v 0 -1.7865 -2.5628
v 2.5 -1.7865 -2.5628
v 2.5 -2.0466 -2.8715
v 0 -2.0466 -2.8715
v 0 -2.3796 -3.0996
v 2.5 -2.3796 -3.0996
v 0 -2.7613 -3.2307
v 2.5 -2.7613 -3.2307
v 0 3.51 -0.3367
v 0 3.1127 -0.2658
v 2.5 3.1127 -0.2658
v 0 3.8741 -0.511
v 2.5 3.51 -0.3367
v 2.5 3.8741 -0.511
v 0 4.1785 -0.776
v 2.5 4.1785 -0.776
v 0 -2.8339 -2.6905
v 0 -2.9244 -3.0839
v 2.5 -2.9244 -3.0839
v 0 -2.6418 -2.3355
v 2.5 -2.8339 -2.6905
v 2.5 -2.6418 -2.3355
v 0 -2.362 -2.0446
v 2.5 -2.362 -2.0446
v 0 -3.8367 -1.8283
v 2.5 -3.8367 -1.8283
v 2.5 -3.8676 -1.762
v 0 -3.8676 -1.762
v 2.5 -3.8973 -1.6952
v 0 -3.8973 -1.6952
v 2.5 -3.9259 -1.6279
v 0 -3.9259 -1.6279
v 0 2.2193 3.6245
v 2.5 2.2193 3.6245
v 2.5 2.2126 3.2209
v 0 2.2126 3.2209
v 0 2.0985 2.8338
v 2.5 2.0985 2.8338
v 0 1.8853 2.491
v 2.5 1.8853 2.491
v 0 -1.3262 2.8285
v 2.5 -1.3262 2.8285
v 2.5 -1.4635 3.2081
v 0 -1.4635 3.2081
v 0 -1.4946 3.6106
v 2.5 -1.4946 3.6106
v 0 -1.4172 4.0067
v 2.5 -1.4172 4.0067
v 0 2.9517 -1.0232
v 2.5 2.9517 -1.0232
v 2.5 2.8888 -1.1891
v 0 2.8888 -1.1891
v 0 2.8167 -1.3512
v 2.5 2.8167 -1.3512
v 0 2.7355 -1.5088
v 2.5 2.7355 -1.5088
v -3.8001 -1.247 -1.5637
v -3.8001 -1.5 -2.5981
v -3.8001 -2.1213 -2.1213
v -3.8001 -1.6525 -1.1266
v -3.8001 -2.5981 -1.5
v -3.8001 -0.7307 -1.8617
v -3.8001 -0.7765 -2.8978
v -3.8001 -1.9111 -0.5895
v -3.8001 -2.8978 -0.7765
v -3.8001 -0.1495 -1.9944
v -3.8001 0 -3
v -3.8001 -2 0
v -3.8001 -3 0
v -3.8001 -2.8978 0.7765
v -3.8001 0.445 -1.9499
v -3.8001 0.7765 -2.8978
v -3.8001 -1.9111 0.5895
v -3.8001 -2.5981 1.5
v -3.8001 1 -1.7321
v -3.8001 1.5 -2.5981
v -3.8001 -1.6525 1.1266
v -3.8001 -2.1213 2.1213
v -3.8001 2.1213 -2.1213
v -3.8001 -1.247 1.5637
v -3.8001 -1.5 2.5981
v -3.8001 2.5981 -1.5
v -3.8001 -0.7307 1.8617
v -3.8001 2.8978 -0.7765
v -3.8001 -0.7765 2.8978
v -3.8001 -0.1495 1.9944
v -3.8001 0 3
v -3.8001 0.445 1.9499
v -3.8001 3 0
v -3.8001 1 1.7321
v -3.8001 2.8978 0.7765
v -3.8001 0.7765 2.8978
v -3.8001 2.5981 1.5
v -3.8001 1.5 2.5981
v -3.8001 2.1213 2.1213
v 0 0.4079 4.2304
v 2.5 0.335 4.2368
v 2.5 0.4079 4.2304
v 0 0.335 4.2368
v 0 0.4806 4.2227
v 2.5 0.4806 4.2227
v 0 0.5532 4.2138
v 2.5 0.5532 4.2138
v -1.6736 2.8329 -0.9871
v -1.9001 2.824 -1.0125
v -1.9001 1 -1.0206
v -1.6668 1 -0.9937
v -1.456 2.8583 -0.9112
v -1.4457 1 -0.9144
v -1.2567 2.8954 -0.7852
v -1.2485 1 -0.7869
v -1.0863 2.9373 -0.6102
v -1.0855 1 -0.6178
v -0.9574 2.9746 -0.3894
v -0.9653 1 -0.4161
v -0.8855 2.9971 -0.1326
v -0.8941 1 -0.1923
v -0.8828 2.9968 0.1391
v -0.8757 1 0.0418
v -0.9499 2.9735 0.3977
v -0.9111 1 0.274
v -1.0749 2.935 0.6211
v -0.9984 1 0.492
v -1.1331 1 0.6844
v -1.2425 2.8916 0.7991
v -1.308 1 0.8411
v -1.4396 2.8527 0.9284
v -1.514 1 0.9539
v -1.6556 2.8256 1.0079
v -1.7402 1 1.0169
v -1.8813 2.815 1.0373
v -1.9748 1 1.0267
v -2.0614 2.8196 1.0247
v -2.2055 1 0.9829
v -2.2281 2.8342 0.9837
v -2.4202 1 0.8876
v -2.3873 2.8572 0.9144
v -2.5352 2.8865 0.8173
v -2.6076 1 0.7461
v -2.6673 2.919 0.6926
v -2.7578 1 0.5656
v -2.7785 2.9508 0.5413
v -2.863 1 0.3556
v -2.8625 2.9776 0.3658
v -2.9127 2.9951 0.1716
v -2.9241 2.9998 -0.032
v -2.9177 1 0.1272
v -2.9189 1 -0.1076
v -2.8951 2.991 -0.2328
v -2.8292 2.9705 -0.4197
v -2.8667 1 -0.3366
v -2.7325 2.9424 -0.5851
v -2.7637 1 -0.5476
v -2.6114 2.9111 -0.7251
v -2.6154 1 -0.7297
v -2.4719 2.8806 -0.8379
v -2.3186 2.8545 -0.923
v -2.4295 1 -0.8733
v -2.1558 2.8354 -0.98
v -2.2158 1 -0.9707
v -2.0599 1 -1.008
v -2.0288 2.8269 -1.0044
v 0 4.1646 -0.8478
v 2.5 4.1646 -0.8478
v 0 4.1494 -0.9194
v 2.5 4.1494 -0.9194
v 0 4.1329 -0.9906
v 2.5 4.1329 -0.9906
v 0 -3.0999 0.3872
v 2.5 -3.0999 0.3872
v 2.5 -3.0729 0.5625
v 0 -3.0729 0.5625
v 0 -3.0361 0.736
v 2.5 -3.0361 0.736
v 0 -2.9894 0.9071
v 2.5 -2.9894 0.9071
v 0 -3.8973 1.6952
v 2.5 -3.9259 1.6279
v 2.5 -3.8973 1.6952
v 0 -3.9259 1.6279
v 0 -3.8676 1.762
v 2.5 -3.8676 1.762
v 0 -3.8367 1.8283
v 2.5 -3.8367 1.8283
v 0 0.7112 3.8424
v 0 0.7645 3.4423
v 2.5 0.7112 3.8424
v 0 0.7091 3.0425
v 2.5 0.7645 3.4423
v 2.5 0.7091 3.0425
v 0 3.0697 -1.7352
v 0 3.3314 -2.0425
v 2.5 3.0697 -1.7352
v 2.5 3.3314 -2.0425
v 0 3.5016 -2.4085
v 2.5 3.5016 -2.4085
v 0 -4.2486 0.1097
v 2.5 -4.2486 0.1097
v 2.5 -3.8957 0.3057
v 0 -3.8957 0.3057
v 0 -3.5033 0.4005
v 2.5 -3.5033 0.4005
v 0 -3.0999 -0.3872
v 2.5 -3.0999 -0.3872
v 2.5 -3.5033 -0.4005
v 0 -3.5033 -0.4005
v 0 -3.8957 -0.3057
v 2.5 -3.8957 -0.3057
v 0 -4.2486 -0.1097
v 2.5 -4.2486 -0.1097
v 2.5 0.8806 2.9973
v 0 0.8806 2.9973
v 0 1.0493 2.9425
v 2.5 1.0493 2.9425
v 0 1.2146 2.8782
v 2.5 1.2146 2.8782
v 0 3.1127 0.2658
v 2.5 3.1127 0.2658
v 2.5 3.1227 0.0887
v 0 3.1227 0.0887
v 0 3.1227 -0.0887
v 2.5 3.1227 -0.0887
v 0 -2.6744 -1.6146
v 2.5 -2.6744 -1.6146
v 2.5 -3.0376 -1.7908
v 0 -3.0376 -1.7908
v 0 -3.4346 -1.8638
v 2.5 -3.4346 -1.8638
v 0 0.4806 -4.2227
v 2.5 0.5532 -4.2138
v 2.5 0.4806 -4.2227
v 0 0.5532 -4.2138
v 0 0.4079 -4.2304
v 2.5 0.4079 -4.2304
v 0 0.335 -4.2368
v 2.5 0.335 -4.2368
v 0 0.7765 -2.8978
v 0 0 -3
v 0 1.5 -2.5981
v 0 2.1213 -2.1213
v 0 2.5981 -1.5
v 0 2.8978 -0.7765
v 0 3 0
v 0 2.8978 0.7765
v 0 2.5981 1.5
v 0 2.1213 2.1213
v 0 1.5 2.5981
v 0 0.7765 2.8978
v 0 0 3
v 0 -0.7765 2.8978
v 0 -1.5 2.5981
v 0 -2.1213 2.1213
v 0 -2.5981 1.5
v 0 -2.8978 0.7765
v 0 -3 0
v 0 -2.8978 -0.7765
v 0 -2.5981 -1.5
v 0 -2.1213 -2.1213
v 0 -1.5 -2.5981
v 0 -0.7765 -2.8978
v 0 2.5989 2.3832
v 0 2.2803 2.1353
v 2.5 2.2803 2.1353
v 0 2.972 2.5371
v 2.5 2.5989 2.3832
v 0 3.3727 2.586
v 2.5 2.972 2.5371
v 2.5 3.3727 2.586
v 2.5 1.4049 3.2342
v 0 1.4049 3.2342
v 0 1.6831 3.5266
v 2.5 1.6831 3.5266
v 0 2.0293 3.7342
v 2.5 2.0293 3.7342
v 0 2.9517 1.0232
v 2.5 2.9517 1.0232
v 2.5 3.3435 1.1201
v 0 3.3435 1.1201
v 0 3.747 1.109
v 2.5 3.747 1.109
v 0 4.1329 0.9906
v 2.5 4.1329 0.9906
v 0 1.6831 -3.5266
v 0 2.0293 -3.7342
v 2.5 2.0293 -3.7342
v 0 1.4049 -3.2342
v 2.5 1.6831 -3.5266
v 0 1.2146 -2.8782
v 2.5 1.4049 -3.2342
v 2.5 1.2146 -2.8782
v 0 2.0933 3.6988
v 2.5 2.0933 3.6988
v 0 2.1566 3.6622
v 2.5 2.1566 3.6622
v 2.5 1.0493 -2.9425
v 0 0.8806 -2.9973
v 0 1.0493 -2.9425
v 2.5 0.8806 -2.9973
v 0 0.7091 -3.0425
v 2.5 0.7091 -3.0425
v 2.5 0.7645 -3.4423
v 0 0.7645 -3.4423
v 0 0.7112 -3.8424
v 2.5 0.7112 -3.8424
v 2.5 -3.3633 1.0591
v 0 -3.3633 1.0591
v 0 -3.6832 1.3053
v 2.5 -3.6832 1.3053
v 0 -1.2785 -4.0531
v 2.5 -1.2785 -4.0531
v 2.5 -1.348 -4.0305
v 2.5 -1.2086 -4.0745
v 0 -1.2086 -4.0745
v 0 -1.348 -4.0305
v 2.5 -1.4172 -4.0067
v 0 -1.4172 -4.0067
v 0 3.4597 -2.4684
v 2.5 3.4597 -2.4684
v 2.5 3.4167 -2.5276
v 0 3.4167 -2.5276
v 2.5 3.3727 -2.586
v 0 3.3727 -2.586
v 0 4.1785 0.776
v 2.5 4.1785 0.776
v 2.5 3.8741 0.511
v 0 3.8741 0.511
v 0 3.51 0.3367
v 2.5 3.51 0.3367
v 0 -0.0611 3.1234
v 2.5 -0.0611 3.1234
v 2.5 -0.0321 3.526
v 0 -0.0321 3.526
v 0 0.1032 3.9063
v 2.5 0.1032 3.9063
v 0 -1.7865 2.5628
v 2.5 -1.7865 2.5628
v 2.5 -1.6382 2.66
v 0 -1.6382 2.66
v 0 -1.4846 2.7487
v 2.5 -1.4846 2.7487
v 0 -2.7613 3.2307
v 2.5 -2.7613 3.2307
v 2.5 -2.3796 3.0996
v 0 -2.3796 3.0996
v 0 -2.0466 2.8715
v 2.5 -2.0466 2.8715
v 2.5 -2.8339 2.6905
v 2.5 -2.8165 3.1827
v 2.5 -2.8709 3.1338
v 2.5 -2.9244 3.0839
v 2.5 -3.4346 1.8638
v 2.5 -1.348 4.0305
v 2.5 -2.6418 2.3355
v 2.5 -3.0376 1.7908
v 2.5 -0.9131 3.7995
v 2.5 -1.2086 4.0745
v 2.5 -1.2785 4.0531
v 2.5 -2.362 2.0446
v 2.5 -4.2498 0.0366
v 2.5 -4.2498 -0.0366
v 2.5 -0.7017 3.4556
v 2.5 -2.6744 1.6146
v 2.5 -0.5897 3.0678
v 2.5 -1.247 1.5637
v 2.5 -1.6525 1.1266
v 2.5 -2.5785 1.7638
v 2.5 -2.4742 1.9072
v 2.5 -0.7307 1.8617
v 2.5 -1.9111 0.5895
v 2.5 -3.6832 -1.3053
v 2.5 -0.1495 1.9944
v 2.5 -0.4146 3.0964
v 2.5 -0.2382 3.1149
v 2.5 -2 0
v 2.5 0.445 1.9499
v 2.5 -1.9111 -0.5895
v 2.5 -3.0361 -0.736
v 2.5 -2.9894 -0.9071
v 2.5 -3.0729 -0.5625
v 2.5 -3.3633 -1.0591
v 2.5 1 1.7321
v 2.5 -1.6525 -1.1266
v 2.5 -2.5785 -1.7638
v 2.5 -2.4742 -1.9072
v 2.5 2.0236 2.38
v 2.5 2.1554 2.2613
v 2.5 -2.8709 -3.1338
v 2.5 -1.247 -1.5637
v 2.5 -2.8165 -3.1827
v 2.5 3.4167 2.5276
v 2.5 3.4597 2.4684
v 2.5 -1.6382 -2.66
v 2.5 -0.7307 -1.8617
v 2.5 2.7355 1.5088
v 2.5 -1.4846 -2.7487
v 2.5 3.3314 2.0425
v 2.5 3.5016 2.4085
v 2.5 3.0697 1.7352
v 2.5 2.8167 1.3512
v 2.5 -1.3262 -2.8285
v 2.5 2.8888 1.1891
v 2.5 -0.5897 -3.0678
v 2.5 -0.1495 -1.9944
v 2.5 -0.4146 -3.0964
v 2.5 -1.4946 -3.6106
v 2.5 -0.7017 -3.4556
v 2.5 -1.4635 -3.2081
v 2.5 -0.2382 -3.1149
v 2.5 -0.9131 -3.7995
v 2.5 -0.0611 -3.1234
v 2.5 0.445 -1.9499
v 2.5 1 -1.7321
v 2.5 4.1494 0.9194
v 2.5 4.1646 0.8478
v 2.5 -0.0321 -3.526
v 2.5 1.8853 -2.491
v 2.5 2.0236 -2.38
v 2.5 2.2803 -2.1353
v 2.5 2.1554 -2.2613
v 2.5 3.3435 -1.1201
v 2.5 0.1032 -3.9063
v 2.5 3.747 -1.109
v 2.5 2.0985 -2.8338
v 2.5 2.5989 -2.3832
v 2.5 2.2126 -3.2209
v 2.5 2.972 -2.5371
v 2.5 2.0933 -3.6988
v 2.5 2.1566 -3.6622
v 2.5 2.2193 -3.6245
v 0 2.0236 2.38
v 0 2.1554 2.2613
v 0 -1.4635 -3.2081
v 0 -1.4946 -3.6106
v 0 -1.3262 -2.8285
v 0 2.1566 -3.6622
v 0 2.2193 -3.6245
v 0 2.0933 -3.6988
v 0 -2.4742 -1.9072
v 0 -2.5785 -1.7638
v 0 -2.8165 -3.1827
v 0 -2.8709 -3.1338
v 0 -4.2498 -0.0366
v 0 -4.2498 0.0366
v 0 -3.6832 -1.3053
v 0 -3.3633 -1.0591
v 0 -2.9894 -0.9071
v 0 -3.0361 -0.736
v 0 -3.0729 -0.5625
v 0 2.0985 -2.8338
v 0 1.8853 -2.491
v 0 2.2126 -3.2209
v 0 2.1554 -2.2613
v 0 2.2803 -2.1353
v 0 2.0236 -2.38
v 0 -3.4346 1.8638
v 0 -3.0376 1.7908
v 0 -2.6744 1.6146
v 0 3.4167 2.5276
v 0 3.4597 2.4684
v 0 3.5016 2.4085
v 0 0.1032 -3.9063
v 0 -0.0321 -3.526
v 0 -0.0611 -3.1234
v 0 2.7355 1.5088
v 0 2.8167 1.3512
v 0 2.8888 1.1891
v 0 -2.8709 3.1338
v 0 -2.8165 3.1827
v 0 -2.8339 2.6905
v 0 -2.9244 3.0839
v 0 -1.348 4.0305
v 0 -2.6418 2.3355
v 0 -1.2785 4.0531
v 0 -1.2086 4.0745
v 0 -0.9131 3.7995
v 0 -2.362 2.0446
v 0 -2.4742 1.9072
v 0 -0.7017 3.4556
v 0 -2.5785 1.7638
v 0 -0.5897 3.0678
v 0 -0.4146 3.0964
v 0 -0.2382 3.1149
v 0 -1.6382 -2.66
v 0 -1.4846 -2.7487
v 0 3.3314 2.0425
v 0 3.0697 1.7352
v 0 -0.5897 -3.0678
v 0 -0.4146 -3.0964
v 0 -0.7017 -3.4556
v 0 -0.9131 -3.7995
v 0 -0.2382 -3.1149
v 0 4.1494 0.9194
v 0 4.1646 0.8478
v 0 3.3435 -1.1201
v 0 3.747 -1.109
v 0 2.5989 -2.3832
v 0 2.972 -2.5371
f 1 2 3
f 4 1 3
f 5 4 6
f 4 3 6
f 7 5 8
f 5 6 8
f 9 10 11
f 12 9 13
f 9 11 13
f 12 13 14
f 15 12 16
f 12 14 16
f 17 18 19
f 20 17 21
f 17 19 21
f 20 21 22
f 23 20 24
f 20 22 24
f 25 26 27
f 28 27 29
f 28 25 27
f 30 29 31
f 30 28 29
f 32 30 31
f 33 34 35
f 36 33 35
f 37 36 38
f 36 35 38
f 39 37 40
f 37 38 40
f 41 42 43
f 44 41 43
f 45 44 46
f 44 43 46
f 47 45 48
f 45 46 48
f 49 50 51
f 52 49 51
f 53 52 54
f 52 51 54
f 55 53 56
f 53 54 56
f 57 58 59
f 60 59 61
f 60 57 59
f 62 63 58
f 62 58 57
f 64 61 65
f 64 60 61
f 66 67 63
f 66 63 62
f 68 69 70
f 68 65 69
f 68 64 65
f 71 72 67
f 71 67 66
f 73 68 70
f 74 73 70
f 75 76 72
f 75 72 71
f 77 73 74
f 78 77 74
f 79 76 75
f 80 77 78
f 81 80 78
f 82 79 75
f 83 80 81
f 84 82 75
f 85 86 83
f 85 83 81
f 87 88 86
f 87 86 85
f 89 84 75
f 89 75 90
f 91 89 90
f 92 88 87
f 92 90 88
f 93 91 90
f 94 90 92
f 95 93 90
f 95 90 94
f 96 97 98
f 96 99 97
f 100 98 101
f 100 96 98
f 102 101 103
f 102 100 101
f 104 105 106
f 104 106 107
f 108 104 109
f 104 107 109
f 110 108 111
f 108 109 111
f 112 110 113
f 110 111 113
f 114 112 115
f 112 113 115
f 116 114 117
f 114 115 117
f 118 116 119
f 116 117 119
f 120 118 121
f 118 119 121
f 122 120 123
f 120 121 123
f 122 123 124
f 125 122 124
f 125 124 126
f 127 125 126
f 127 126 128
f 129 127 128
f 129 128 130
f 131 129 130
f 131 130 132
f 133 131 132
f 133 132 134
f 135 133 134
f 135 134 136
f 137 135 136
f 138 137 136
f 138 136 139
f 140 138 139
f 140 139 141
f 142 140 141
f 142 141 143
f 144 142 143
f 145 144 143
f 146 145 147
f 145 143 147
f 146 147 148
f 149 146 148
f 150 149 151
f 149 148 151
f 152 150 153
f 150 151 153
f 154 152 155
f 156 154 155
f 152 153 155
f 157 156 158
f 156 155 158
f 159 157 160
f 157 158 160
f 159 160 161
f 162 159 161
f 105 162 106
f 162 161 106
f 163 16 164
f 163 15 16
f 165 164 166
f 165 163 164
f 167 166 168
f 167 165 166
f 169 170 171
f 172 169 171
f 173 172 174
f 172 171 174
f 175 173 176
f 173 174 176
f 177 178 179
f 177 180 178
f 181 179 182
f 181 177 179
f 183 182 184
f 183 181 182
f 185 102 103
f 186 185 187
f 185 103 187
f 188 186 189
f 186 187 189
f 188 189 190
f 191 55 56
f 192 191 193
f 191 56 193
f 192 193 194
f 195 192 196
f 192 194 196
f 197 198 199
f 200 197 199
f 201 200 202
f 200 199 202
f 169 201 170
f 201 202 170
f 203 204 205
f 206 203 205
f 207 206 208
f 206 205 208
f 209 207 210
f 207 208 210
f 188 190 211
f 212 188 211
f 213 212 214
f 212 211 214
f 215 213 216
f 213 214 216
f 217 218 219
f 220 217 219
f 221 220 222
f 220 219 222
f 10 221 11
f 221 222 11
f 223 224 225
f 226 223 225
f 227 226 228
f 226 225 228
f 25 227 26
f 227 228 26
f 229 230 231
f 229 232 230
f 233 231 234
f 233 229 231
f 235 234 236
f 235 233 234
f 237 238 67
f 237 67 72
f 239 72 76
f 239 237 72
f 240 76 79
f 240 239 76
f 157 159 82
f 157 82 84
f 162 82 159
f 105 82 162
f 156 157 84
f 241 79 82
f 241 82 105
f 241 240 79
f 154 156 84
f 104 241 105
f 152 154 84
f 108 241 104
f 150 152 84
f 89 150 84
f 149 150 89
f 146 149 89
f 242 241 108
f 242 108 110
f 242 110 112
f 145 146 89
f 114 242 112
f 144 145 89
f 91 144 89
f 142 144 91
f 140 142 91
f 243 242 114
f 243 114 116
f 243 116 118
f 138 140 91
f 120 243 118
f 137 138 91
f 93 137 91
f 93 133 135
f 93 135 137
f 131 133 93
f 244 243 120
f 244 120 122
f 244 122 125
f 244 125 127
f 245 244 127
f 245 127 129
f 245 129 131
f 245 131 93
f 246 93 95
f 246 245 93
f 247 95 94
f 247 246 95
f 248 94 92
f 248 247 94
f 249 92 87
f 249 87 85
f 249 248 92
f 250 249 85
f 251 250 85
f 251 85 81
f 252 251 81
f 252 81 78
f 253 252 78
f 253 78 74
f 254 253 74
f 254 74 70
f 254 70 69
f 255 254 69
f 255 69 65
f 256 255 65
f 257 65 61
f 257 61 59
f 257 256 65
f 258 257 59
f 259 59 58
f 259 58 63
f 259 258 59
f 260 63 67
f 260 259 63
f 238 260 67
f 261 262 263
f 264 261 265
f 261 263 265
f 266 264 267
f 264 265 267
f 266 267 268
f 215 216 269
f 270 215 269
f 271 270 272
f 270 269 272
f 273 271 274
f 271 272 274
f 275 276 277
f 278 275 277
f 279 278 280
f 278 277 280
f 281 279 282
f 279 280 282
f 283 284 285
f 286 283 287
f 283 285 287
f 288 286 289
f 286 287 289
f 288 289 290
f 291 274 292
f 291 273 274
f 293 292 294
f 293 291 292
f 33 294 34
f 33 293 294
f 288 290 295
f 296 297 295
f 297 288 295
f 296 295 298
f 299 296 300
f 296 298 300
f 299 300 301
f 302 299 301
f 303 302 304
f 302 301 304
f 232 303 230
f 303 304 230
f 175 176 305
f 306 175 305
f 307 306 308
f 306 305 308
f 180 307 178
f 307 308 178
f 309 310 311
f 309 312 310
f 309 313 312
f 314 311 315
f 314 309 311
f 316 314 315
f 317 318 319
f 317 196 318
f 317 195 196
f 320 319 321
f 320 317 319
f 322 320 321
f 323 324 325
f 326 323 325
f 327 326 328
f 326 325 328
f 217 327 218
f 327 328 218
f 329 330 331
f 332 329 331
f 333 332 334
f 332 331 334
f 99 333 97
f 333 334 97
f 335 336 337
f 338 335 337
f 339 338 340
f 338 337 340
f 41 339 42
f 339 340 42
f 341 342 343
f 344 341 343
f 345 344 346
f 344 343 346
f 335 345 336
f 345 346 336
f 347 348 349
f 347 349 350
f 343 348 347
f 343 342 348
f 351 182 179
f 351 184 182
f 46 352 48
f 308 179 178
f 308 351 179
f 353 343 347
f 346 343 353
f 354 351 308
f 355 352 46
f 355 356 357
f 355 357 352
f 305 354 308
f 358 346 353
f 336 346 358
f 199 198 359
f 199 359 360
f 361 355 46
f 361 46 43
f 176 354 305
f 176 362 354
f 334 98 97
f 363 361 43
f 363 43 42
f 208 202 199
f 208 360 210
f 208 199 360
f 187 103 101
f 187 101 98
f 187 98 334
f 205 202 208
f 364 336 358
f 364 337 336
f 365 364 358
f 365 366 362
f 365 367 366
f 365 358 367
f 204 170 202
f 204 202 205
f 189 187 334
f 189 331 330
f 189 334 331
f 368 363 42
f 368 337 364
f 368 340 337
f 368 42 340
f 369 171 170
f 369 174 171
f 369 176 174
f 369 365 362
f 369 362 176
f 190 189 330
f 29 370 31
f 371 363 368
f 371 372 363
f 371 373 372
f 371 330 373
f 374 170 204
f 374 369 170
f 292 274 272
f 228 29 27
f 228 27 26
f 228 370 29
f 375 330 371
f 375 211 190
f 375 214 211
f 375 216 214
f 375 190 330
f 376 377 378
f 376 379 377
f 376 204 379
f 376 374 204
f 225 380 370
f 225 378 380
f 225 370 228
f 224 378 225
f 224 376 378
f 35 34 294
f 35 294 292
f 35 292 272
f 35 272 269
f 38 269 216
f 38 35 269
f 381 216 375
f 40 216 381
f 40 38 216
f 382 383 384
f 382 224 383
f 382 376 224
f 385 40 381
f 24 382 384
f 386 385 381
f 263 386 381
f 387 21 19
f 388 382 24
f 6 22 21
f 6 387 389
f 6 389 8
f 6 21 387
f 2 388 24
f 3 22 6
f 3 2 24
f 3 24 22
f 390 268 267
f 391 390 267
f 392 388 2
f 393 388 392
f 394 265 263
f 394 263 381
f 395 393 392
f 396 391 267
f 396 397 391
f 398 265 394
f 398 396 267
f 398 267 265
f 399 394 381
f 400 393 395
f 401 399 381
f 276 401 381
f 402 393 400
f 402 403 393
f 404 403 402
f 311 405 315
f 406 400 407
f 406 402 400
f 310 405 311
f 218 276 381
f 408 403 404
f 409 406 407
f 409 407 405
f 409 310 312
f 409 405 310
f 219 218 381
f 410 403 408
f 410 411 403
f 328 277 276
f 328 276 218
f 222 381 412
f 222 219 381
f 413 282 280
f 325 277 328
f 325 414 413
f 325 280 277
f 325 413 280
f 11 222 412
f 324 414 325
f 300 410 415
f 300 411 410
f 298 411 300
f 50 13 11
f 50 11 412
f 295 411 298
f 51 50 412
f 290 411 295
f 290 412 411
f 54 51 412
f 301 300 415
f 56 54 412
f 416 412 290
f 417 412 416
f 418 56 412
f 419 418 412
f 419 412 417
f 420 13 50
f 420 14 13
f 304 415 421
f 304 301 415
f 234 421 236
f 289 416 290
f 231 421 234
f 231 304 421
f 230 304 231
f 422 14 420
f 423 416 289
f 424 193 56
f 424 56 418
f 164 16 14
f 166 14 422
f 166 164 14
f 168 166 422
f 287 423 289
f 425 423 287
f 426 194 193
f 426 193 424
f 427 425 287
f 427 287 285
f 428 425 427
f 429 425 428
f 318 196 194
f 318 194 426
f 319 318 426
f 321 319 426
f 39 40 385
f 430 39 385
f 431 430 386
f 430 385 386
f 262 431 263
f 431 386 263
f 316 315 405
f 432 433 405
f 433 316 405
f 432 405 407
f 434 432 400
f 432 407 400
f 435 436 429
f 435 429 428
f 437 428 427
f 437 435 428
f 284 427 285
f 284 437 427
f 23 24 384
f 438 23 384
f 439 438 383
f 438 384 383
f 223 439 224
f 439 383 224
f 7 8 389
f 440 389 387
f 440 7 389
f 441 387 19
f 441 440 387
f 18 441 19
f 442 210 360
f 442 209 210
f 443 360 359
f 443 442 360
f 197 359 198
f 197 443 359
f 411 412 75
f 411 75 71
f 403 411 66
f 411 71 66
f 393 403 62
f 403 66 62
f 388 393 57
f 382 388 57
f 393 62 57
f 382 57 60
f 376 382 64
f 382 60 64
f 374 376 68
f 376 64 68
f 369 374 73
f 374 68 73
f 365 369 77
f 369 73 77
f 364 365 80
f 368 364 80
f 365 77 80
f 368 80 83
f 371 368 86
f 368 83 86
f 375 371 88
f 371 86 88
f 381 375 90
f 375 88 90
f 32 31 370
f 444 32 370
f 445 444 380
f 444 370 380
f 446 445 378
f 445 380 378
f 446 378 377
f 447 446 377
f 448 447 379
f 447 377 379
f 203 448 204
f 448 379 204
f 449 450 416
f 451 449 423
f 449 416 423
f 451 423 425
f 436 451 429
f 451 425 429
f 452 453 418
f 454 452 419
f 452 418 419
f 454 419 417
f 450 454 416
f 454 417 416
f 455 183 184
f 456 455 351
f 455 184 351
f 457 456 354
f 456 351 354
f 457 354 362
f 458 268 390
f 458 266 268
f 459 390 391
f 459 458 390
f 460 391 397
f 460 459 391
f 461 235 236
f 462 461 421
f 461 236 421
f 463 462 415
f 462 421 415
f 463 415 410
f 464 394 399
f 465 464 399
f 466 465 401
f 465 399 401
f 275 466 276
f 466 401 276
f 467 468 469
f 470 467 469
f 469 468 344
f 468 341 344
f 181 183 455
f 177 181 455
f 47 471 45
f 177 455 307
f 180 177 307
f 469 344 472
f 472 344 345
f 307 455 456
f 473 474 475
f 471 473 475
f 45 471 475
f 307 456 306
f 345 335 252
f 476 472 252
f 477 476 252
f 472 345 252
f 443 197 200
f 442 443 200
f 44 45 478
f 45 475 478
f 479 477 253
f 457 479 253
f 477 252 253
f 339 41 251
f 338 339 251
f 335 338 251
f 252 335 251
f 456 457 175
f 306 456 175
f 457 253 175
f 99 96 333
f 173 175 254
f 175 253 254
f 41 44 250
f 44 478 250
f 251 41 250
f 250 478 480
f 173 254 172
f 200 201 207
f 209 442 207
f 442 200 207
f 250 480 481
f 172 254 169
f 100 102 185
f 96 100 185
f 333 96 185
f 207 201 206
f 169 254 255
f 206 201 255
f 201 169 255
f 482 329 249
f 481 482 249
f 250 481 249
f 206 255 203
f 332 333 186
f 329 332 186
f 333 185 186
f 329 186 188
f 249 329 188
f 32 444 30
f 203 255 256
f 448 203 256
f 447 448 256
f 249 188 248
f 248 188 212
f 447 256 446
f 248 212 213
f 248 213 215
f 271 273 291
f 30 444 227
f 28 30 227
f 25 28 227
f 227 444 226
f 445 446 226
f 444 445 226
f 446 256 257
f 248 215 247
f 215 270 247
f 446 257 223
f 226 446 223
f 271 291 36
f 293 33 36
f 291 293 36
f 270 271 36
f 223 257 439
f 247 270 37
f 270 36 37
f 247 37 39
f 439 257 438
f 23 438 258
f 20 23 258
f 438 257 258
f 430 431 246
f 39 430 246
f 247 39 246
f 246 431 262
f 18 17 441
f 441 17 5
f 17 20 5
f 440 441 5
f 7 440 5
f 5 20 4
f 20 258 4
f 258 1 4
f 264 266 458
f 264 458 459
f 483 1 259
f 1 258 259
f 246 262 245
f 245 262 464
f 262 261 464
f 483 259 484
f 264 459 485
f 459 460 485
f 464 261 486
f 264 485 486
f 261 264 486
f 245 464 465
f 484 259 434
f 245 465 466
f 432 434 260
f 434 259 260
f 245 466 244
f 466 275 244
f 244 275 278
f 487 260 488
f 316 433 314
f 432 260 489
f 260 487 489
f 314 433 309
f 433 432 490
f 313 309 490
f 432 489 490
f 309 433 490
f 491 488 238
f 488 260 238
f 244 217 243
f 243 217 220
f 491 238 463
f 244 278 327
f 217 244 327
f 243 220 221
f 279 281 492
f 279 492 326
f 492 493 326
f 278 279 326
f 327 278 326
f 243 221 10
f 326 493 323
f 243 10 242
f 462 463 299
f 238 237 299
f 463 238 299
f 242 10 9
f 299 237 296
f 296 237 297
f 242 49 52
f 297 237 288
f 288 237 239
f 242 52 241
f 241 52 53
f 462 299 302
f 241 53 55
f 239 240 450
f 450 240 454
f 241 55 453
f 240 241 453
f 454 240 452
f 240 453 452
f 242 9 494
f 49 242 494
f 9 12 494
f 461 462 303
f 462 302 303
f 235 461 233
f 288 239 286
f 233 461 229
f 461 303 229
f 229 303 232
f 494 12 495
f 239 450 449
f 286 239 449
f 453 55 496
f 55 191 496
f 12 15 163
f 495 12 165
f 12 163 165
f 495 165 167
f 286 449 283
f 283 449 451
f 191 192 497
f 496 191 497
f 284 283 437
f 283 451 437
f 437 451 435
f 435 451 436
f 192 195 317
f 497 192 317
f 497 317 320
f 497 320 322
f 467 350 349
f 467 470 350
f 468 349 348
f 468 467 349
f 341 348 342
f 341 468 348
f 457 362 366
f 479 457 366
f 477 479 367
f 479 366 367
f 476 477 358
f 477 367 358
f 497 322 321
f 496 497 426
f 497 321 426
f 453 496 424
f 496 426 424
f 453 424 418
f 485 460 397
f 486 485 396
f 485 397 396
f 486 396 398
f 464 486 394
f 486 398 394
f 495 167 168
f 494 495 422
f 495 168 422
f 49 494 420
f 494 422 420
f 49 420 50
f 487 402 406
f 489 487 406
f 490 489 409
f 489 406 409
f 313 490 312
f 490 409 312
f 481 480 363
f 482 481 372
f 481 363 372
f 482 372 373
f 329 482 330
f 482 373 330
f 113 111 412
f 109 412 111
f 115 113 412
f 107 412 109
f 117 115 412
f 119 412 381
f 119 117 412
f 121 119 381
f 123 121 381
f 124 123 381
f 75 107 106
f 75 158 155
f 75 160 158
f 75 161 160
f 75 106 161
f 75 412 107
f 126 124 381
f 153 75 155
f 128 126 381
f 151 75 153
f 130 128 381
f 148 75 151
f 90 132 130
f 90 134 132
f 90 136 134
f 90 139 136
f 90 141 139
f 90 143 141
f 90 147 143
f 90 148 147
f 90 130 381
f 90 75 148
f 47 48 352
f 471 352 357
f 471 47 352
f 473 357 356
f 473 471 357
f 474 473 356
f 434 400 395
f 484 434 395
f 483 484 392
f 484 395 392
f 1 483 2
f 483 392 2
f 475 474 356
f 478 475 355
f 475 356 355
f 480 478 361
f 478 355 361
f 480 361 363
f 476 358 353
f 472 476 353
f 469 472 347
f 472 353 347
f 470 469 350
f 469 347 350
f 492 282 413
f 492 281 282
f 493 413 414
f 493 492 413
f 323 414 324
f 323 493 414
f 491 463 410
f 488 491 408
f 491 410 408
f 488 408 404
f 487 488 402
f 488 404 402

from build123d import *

# Parameters (mm, degrees)
SKETCH1_W                          = 2.5
SKETCH1_H                          = 4.25
CUT_EXTRUDE1_DEPTH                 = 7.509608283
CUT_EXTRUDE2_DEPTH                 = 7.509608283
CUT_EXTRUDE3_DEPTH                 = 7.509608283
CUT_EXTRUDE4_DEPTH                 = 7.509608283
CUT_EXTRUDE5_DEPTH                 = 7.509608283
CUT_EXTRUDE6_DEPTH                 = 7.509608283
CUT_EXTRUDE7_DEPTH                 = 7.509608283
CUT_EXTRUDE8_DEPTH                 = 7.509608283
CUT_EXTRUDE9_DEPTH                 = 7.509608283
CUT_EXTRUDE10_DEPTH                = 7.509608283
CUT_EXTRUDE11_DEPTH                = 7.500982013
CUT_EXTRUDE12_DEPTH                = 7.500982013
CUT_EXTRUDE13_DEPTH                = 7.500982013
CUT_EXTRUDE14_DEPTH                = 7.500982013
CUT_EXTRUDE15_DEPTH                = 7.500982013
SKETCH17_W                         = 3.8000508
SKETCH17_H                         = 3
F_4_0_4_DIAMETER_HOLE1_D           = 4
BOSS_EXTRUDE2_DEPTH                = 6.3000508
TAP_DRILL_FOR_M2_5X0_45_TAP1_D     = 2.05
TAP_DRILL_FOR_M2_5X0_45_TAP1_DEPTH = 3


with BuildPart() as part:
    # Sketch1 → Revolve1 (revolve)
    with BuildSketch(Plane(origin=(0, 0, 0), x_dir=(-1, 0, 0), z_dir=(0, 0, -1)), mode=Mode.PRIVATE) as revolve1_sk:
        with Locations((-1.25, 2.125)):
            Rectangle(SKETCH1_W, SKETCH1_H)
    revolve(revolve1_sk.sketch.rotate(Axis((2.5, 0, 0), (-1, 0, 0)), 270), axis=Axis((2.5, 0, 0), (-1, 0, 0)))

    # Sketch2 → Cut-Extrude1 (cut, through all)
    with BuildSketch(Plane(origin=(2.5, 0, 0), x_dir=(0, 0, -1), z_dir=(1, 0, 0))):
        with BuildLine():
            ThreePointArc((2.585993953, 3.372704445), (2.472774023, 2.780247912), (2.135335156, 2.280289405))
            ThreePointArc((2.135335156, 2.280289405), (2.321584435, 2.090364014), (2.491001044, 1.88528242))
            ThreePointArc((2.491001044, 1.88528242), (3.023492692, 2.168612866), (3.624538392, 2.219283994))
            ThreePointArc((3.624538392, 2.219283994), (3.158365508, 2.843805077), (2.585993953, 3.372704445))
        make_face()
    extrude(amount=-CUT_EXTRUDE1_DEPTH, mode=Mode.SUBTRACT)

    # Sketch3 → Cut-Extrude2 (cut, through all)
    with BuildSketch(Plane(origin=(2.5, 0, 0), x_dir=(0, 0, -1), z_dir=(1, 0, 0))):
        with BuildLine():
            ThreePointArc((3.734225512, 2.029300328), (3.389820178, 1.534115047), (2.87820299, 1.214628975))
            ThreePointArc((2.87820299, 1.214628975), (2.971100557, 0.96536909), (3.042456131, 0.709109787))
            ThreePointArc((3.042456131, 0.709109787), (3.644152332, 0.751361165), (4.213844705, 0.553184234))
            ThreePointArc((4.213844705, 0.553184234), (4.041990194, 1.313322226), (3.734225512, 2.029300328))
        make_face()
    extrude(amount=-CUT_EXTRUDE2_DEPTH, mode=Mode.SUBTRACT)

    # Sketch4 → Cut-Extrude3 (cut, through all)
    with BuildSketch(Plane(origin=(2.5, 0, 0), x_dir=(0, 0, -1), z_dir=(1, 0, 0))):
        with BuildLine():
            ThreePointArc((4.236775558, 0.335011746), (3.72073563, 0.022719752), (3.12340338, -0.061051839))
            ThreePointArc((3.12340338, -0.061051839), (3.106886401, -0.326546919), (3.067842913, -0.589674367))
            ThreePointArc((3.067842913, -0.589674367), (3.634704928, -0.795807707), (4.074538988, -1.208566106))
            ThreePointArc((4.074538988, -1.208566106), (4.226718055, -0.444245969), (4.236775558, 0.335011746))
        make_face()
    extrude(amount=-CUT_EXTRUDE3_DEPTH, mode=Mode.SUBTRACT)

    # Sketch5 → Cut-Extrude4 (cut, through all)
    with BuildSketch(Plane(origin=(2.5, 0, 0), x_dir=(0, 0, -1), z_dir=(1, 0, 0))):
        with BuildLine():
            ThreePointArc((4.00674862, -1.417203408), (3.40830209, -1.492603993), (2.82853895, -1.326176235))
            ThreePointArc((2.82853895, -1.326176235), (2.705463361, -1.562), (2.562771785, -1.786498468))
            ThreePointArc((2.562771785, -1.786498468), (2.996784021, -2.205374197), (3.230708464, -2.761344386))
            ThreePointArc((3.230708464, -2.761344386), (3.680607966, -2.124999999), (4.00674862, -1.417203408))
        make_face()
    extrude(amount=-CUT_EXTRUDE4_DEPTH, mode=Mode.SUBTRACT)

    # Sketch6 → Cut-Extrude5 (cut, through all)
    with BuildSketch(Plane(origin=(2.5, 0, 0), x_dir=(0, 0, -1), z_dir=(1, 0, 0))):
        with BuildLine():
            ThreePointArc((3.083918444, -2.92437122), (2.506542154, -2.749842949), (2.044594439, -2.361992714))
            ThreePointArc((2.044594439, -2.361992714), (1.836241128, -2.52736909), (1.614574134, -2.674420753))
            ThreePointArc((1.614574134, -2.674420753), (1.840691933, -3.233611452), (1.828259097, -3.836661137))
            ThreePointArc((1.828259097, -3.836661137), (2.498087322, -3.438322226), (3.083918444, -2.92437122))
        make_face()
    extrude(amount=-CUT_EXTRUDE5_DEPTH, mode=Mode.SUBTRACT)

    # Sketch7 → Cut-Extrude6 (cut, through all)
    with BuildSketch(Plane(origin=(2.5, 0, 0), x_dir=(0, 0, -1), z_dir=(1, 0, 0))):
        with BuildLine():
            ThreePointArc((1.627850754, -3.925888679), (1.17137831, -3.531609077), (0.907120976, -2.989399193))
            ThreePointArc((0.907120976, -2.989399193), (0.649516122, -3.055733105), (0.387201946, -3.099911394))
            ThreePointArc((0.387201946, -3.099911394), (0.366327487, -3.702727912), (0.109687121, -4.248584321))
            ThreePointArc((0.109687121, -4.248584321), (0.883624686, -4.157127303), (1.627850754, -3.925888679))
        make_face()
    extrude(amount=-CUT_EXTRUDE6_DEPTH, mode=Mode.SUBTRACT)

    # Sketch8 → Cut-Extrude7 (cut, through all)
    with BuildSketch(Plane(origin=(2.5, 0, 0), x_dir=(0, 0, -1), z_dir=(1, 0, 0))):
        with BuildLine():
            ThreePointArc((-0.109687122, -4.248584322), (-0.366327487, -3.702727912), (-0.387201947, -3.099911394))
            ThreePointArc((-0.387201947, -3.099911394), (-0.649516122, -3.055733105), (-0.907120975, -2.989399193))
            ThreePointArc((-0.907120975, -2.989399193), (-1.171378309, -3.531609077), (-1.627850753, -3.92588868))
            ThreePointArc((-1.627850753, -3.92588868), (-0.883624686, -4.157127304), (-0.109687122, -4.248584322))
        make_face()
    extrude(amount=-CUT_EXTRUDE7_DEPTH, mode=Mode.SUBTRACT)

    # Sketch9 → Cut-Extrude8 (cut, through all)
    with BuildSketch(Plane(origin=(2.5, 0, 0), x_dir=(0, 0, -1), z_dir=(1, 0, 0))):
        with BuildLine():
            ThreePointArc((-1.828259096, -3.836661137), (-1.840691932, -3.233611453), (-1.614574133, -2.674420754))
            ThreePointArc((-1.614574133, -2.674420754), (-1.836241128, -2.527369091), (-2.044594439, -2.361992714))
            ThreePointArc((-2.044594439, -2.361992714), (-2.506542155, -2.749842949), (-3.083918444, -2.92437122))
            ThreePointArc((-3.083918444, -2.92437122), (-2.498087322, -3.438322226), (-1.828259096, -3.836661137))
        make_face()
    extrude(amount=-CUT_EXTRUDE8_DEPTH, mode=Mode.SUBTRACT)

    # Sketch10 → Cut-Extrude9 (cut, through all)
    with BuildSketch(Plane(origin=(2.5, 0, 0), x_dir=(0, 0, -1), z_dir=(1, 0, 0))):
        with BuildLine():
            ThreePointArc((-3.230708464, -2.761344387), (-2.996784021, -2.205374197), (-2.562771785, -1.786498468))
            ThreePointArc((-2.562771785, -1.786498468), (-2.705463361, -1.562), (-2.82853895, -1.326176236))
            ThreePointArc((-2.82853895, -1.326176236), (-3.40830209, -1.492603994), (-4.006748619, -1.417203409))
            ThreePointArc((-4.006748619, -1.417203409), (-3.680607966, -2.125), (-3.230708464, -2.761344387))
        make_face()
    extrude(amount=-CUT_EXTRUDE9_DEPTH, mode=Mode.SUBTRACT)

    # Sketch11 → Cut-Extrude10 (cut, through all)
    with BuildSketch(Plane(origin=(2.5, 0, 0), x_dir=(0, 0, -1), z_dir=(1, 0, 0))):
        with BuildLine():
            ThreePointArc((-4.074538989, -1.208566105), (-3.634704928, -0.795807707), (-3.067842914, -0.589674368))
            ThreePointArc((-3.067842914, -0.589674368), (-3.106886402, -0.326546919), (-3.12340338, -0.061051839))
            ThreePointArc((-3.12340338, -0.061051839), (-3.720735631, 0.022719752), (-4.236775558, 0.335011747))
            ThreePointArc((-4.236775558, 0.335011747), (-4.226718056, -0.444245968), (-4.074538989, -1.208566105))
        make_face()
    extrude(amount=-CUT_EXTRUDE10_DEPTH, mode=Mode.SUBTRACT)

    # Sketch12 → Cut-Extrude11 (cut, through all)
    with BuildSketch(Plane(origin=(2.5, 0, 0), x_dir=(0, 0, -1), z_dir=(1, 0, 0))):
        with BuildLine():
            ThreePointArc((-4.213844706, 0.553184234), (-3.644152332, 0.751361165), (-3.042456131, 0.709109788))
            ThreePointArc((-3.042456131, 0.709109788), (-2.971100557, 0.96536909), (-2.87820299, 1.214628975))
            ThreePointArc((-2.87820299, 1.214628975), (-3.389820179, 1.534115046), (-3.734225513, 2.029300326))
            ThreePointArc((-3.734225513, 2.029300326), (-4.041990195, 1.313322226), (-4.213844706, 0.553184234))
        make_face()
    extrude(amount=-CUT_EXTRUDE11_DEPTH, mode=Mode.SUBTRACT)

    # Sketch13 → Cut-Extrude12 (cut, through all)
    with BuildSketch(Plane(origin=(2.5, 0, 0), x_dir=(0, 0, -1), z_dir=(1, 0, 0))):
        with BuildLine():
            ThreePointArc((-2.585993952, 3.372704446), (-3.158365508, 2.843805077), (-3.624538391, 2.219283994))
            ThreePointArc((-3.624538391, 2.219283994), (-3.023492692, 2.168612865), (-2.491001044, 1.885282419))
            ThreePointArc((-2.491001044, 1.885282419), (-2.321584435, 2.090364014), (-2.135335156, 2.280289405))
            ThreePointArc((-2.135335156, 2.280289405), (-2.472774022, 2.780247912), (-2.585993952, 3.372704446))
        make_face()
    extrude(amount=-CUT_EXTRUDE12_DEPTH, mode=Mode.SUBTRACT)

    # Sketch14 → Cut-Extrude13 (cut, through all)
    with BuildSketch(Plane(origin=(2.5, 0, 0), x_dir=(0, 0, -1), z_dir=(1, 0, 0))):
        with BuildLine():
            ThreePointArc((-0.990620545, 4.132937326), (-1.728630733, 3.882568195), (-2.408516462, 3.501649391))
            ThreePointArc((-2.408516462, 3.501649391), (-1.880043697, 3.210891701), (-1.508829246, 2.735472593))
            ThreePointArc((-1.508829246, 2.735472593), (-1.270645273, 2.85391601), (-1.023248474, 2.951667081))
            ThreePointArc((-1.023248474, 2.951667081), (-1.128162774, 3.545650656), (-0.990620545, 4.132937326))
        make_face()
    extrude(amount=-CUT_EXTRUDE13_DEPTH, mode=Mode.SUBTRACT)

    # Sketch15 → Cut-Extrude14 (cut, through all)
    with BuildSketch(Plane(origin=(2.5, 0, 0), x_dir=(0, 0, -1), z_dir=(1, 0, 0))):
        with BuildLine():
            ThreePointArc((-0.776040155, 4.178547795), (-0.411518069, 3.69797819), (-0.265767165, 3.112674704))
            ThreePointArc((-0.265767165, 3.112674704), (0, 3.124), (0.265767165, 3.112674704))
            ThreePointArc((0.265767165, 3.112674704), (0.411518069, 3.69797819), (0.776040156, 4.178547795))
            ThreePointArc((0.776040156, 4.178547795), (0, 4.25), (-0.776040155, 4.178547795))
        make_face()
    extrude(amount=-CUT_EXTRUDE14_DEPTH, mode=Mode.SUBTRACT)

    # Sketch16 → Cut-Extrude15 (cut, through all)
    with BuildSketch(Plane(origin=(2.5, 0, 0), x_dir=(0, 0, -1), z_dir=(1, 0, 0))):
        with BuildLine():
            ThreePointArc((0.990620545, 4.132937326), (1.128162774, 3.545650656), (1.023248474, 2.951667081))
            ThreePointArc((1.023248474, 2.951667081), (1.270645273, 2.85391601), (1.508829246, 2.735472593))
            ThreePointArc((1.508829246, 2.735472593), (1.880043697, 3.210891701), (2.408516462, 3.50164939))
            ThreePointArc((2.408516462, 3.50164939), (1.728630733, 3.882568195), (0.990620545, 4.132937326))
        make_face()
    extrude(amount=-CUT_EXTRUDE15_DEPTH, mode=Mode.SUBTRACT)

    # Sketch17 → Revolve2 (revolve)
    with BuildSketch(Plane.XY, mode=Mode.PRIVATE) as revolve2_sk:
        with Locations((-1.9000254, 1.5)):
            Rectangle(SKETCH17_W, SKETCH17_H)
    revolve(revolve2_sk.sketch.rotate(Axis((-3.8000508, 0, 0), (1, 0, 0)), 270), axis=Axis((-3.8000508, 0, 0), (1, 0, 0)))

    # Ø4.0 (4) Diameter Hole1 (through all)
    with Locations(Plane(origin=(2.5, 0, 0), x_dir=(0, 0, -1), z_dir=(1, 0, 0))):
        with Locations((0, 0)):
            Hole(F_4_0_4_DIAMETER_HOLE1_D / 2)

    # Sketch21 → Boss-Extrude2 (add)
    with BuildSketch(Plane.ZY.offset(3.8000508)):
        with BuildLine():
            Line((-1.732050808, 1), (1.732050808, 1))
            ThreePointArc((1.732050808, 1), (0, 2), (-1.732050808, 1))
        make_face()
    extrude(amount=-BOSS_EXTRUDE2_DEPTH)

    # Tap Drill for M2.5x0.45 Tap1
    with Locations(Plane(origin=(-1.9000508, 2.999970615, 0.013278053), x_dir=(0, -0.004426017667, 0.999990205136), z_dir=(0, 0.999990205136, 0.004426017667))):
        with Locations((0, 0)):
            Hole(TAP_DRILL_FOR_M2_5X0_45_TAP1_D / 2, depth=TAP_DRILL_FOR_M2_5X0_45_TAP1_DEPTH)


solid = part.part
